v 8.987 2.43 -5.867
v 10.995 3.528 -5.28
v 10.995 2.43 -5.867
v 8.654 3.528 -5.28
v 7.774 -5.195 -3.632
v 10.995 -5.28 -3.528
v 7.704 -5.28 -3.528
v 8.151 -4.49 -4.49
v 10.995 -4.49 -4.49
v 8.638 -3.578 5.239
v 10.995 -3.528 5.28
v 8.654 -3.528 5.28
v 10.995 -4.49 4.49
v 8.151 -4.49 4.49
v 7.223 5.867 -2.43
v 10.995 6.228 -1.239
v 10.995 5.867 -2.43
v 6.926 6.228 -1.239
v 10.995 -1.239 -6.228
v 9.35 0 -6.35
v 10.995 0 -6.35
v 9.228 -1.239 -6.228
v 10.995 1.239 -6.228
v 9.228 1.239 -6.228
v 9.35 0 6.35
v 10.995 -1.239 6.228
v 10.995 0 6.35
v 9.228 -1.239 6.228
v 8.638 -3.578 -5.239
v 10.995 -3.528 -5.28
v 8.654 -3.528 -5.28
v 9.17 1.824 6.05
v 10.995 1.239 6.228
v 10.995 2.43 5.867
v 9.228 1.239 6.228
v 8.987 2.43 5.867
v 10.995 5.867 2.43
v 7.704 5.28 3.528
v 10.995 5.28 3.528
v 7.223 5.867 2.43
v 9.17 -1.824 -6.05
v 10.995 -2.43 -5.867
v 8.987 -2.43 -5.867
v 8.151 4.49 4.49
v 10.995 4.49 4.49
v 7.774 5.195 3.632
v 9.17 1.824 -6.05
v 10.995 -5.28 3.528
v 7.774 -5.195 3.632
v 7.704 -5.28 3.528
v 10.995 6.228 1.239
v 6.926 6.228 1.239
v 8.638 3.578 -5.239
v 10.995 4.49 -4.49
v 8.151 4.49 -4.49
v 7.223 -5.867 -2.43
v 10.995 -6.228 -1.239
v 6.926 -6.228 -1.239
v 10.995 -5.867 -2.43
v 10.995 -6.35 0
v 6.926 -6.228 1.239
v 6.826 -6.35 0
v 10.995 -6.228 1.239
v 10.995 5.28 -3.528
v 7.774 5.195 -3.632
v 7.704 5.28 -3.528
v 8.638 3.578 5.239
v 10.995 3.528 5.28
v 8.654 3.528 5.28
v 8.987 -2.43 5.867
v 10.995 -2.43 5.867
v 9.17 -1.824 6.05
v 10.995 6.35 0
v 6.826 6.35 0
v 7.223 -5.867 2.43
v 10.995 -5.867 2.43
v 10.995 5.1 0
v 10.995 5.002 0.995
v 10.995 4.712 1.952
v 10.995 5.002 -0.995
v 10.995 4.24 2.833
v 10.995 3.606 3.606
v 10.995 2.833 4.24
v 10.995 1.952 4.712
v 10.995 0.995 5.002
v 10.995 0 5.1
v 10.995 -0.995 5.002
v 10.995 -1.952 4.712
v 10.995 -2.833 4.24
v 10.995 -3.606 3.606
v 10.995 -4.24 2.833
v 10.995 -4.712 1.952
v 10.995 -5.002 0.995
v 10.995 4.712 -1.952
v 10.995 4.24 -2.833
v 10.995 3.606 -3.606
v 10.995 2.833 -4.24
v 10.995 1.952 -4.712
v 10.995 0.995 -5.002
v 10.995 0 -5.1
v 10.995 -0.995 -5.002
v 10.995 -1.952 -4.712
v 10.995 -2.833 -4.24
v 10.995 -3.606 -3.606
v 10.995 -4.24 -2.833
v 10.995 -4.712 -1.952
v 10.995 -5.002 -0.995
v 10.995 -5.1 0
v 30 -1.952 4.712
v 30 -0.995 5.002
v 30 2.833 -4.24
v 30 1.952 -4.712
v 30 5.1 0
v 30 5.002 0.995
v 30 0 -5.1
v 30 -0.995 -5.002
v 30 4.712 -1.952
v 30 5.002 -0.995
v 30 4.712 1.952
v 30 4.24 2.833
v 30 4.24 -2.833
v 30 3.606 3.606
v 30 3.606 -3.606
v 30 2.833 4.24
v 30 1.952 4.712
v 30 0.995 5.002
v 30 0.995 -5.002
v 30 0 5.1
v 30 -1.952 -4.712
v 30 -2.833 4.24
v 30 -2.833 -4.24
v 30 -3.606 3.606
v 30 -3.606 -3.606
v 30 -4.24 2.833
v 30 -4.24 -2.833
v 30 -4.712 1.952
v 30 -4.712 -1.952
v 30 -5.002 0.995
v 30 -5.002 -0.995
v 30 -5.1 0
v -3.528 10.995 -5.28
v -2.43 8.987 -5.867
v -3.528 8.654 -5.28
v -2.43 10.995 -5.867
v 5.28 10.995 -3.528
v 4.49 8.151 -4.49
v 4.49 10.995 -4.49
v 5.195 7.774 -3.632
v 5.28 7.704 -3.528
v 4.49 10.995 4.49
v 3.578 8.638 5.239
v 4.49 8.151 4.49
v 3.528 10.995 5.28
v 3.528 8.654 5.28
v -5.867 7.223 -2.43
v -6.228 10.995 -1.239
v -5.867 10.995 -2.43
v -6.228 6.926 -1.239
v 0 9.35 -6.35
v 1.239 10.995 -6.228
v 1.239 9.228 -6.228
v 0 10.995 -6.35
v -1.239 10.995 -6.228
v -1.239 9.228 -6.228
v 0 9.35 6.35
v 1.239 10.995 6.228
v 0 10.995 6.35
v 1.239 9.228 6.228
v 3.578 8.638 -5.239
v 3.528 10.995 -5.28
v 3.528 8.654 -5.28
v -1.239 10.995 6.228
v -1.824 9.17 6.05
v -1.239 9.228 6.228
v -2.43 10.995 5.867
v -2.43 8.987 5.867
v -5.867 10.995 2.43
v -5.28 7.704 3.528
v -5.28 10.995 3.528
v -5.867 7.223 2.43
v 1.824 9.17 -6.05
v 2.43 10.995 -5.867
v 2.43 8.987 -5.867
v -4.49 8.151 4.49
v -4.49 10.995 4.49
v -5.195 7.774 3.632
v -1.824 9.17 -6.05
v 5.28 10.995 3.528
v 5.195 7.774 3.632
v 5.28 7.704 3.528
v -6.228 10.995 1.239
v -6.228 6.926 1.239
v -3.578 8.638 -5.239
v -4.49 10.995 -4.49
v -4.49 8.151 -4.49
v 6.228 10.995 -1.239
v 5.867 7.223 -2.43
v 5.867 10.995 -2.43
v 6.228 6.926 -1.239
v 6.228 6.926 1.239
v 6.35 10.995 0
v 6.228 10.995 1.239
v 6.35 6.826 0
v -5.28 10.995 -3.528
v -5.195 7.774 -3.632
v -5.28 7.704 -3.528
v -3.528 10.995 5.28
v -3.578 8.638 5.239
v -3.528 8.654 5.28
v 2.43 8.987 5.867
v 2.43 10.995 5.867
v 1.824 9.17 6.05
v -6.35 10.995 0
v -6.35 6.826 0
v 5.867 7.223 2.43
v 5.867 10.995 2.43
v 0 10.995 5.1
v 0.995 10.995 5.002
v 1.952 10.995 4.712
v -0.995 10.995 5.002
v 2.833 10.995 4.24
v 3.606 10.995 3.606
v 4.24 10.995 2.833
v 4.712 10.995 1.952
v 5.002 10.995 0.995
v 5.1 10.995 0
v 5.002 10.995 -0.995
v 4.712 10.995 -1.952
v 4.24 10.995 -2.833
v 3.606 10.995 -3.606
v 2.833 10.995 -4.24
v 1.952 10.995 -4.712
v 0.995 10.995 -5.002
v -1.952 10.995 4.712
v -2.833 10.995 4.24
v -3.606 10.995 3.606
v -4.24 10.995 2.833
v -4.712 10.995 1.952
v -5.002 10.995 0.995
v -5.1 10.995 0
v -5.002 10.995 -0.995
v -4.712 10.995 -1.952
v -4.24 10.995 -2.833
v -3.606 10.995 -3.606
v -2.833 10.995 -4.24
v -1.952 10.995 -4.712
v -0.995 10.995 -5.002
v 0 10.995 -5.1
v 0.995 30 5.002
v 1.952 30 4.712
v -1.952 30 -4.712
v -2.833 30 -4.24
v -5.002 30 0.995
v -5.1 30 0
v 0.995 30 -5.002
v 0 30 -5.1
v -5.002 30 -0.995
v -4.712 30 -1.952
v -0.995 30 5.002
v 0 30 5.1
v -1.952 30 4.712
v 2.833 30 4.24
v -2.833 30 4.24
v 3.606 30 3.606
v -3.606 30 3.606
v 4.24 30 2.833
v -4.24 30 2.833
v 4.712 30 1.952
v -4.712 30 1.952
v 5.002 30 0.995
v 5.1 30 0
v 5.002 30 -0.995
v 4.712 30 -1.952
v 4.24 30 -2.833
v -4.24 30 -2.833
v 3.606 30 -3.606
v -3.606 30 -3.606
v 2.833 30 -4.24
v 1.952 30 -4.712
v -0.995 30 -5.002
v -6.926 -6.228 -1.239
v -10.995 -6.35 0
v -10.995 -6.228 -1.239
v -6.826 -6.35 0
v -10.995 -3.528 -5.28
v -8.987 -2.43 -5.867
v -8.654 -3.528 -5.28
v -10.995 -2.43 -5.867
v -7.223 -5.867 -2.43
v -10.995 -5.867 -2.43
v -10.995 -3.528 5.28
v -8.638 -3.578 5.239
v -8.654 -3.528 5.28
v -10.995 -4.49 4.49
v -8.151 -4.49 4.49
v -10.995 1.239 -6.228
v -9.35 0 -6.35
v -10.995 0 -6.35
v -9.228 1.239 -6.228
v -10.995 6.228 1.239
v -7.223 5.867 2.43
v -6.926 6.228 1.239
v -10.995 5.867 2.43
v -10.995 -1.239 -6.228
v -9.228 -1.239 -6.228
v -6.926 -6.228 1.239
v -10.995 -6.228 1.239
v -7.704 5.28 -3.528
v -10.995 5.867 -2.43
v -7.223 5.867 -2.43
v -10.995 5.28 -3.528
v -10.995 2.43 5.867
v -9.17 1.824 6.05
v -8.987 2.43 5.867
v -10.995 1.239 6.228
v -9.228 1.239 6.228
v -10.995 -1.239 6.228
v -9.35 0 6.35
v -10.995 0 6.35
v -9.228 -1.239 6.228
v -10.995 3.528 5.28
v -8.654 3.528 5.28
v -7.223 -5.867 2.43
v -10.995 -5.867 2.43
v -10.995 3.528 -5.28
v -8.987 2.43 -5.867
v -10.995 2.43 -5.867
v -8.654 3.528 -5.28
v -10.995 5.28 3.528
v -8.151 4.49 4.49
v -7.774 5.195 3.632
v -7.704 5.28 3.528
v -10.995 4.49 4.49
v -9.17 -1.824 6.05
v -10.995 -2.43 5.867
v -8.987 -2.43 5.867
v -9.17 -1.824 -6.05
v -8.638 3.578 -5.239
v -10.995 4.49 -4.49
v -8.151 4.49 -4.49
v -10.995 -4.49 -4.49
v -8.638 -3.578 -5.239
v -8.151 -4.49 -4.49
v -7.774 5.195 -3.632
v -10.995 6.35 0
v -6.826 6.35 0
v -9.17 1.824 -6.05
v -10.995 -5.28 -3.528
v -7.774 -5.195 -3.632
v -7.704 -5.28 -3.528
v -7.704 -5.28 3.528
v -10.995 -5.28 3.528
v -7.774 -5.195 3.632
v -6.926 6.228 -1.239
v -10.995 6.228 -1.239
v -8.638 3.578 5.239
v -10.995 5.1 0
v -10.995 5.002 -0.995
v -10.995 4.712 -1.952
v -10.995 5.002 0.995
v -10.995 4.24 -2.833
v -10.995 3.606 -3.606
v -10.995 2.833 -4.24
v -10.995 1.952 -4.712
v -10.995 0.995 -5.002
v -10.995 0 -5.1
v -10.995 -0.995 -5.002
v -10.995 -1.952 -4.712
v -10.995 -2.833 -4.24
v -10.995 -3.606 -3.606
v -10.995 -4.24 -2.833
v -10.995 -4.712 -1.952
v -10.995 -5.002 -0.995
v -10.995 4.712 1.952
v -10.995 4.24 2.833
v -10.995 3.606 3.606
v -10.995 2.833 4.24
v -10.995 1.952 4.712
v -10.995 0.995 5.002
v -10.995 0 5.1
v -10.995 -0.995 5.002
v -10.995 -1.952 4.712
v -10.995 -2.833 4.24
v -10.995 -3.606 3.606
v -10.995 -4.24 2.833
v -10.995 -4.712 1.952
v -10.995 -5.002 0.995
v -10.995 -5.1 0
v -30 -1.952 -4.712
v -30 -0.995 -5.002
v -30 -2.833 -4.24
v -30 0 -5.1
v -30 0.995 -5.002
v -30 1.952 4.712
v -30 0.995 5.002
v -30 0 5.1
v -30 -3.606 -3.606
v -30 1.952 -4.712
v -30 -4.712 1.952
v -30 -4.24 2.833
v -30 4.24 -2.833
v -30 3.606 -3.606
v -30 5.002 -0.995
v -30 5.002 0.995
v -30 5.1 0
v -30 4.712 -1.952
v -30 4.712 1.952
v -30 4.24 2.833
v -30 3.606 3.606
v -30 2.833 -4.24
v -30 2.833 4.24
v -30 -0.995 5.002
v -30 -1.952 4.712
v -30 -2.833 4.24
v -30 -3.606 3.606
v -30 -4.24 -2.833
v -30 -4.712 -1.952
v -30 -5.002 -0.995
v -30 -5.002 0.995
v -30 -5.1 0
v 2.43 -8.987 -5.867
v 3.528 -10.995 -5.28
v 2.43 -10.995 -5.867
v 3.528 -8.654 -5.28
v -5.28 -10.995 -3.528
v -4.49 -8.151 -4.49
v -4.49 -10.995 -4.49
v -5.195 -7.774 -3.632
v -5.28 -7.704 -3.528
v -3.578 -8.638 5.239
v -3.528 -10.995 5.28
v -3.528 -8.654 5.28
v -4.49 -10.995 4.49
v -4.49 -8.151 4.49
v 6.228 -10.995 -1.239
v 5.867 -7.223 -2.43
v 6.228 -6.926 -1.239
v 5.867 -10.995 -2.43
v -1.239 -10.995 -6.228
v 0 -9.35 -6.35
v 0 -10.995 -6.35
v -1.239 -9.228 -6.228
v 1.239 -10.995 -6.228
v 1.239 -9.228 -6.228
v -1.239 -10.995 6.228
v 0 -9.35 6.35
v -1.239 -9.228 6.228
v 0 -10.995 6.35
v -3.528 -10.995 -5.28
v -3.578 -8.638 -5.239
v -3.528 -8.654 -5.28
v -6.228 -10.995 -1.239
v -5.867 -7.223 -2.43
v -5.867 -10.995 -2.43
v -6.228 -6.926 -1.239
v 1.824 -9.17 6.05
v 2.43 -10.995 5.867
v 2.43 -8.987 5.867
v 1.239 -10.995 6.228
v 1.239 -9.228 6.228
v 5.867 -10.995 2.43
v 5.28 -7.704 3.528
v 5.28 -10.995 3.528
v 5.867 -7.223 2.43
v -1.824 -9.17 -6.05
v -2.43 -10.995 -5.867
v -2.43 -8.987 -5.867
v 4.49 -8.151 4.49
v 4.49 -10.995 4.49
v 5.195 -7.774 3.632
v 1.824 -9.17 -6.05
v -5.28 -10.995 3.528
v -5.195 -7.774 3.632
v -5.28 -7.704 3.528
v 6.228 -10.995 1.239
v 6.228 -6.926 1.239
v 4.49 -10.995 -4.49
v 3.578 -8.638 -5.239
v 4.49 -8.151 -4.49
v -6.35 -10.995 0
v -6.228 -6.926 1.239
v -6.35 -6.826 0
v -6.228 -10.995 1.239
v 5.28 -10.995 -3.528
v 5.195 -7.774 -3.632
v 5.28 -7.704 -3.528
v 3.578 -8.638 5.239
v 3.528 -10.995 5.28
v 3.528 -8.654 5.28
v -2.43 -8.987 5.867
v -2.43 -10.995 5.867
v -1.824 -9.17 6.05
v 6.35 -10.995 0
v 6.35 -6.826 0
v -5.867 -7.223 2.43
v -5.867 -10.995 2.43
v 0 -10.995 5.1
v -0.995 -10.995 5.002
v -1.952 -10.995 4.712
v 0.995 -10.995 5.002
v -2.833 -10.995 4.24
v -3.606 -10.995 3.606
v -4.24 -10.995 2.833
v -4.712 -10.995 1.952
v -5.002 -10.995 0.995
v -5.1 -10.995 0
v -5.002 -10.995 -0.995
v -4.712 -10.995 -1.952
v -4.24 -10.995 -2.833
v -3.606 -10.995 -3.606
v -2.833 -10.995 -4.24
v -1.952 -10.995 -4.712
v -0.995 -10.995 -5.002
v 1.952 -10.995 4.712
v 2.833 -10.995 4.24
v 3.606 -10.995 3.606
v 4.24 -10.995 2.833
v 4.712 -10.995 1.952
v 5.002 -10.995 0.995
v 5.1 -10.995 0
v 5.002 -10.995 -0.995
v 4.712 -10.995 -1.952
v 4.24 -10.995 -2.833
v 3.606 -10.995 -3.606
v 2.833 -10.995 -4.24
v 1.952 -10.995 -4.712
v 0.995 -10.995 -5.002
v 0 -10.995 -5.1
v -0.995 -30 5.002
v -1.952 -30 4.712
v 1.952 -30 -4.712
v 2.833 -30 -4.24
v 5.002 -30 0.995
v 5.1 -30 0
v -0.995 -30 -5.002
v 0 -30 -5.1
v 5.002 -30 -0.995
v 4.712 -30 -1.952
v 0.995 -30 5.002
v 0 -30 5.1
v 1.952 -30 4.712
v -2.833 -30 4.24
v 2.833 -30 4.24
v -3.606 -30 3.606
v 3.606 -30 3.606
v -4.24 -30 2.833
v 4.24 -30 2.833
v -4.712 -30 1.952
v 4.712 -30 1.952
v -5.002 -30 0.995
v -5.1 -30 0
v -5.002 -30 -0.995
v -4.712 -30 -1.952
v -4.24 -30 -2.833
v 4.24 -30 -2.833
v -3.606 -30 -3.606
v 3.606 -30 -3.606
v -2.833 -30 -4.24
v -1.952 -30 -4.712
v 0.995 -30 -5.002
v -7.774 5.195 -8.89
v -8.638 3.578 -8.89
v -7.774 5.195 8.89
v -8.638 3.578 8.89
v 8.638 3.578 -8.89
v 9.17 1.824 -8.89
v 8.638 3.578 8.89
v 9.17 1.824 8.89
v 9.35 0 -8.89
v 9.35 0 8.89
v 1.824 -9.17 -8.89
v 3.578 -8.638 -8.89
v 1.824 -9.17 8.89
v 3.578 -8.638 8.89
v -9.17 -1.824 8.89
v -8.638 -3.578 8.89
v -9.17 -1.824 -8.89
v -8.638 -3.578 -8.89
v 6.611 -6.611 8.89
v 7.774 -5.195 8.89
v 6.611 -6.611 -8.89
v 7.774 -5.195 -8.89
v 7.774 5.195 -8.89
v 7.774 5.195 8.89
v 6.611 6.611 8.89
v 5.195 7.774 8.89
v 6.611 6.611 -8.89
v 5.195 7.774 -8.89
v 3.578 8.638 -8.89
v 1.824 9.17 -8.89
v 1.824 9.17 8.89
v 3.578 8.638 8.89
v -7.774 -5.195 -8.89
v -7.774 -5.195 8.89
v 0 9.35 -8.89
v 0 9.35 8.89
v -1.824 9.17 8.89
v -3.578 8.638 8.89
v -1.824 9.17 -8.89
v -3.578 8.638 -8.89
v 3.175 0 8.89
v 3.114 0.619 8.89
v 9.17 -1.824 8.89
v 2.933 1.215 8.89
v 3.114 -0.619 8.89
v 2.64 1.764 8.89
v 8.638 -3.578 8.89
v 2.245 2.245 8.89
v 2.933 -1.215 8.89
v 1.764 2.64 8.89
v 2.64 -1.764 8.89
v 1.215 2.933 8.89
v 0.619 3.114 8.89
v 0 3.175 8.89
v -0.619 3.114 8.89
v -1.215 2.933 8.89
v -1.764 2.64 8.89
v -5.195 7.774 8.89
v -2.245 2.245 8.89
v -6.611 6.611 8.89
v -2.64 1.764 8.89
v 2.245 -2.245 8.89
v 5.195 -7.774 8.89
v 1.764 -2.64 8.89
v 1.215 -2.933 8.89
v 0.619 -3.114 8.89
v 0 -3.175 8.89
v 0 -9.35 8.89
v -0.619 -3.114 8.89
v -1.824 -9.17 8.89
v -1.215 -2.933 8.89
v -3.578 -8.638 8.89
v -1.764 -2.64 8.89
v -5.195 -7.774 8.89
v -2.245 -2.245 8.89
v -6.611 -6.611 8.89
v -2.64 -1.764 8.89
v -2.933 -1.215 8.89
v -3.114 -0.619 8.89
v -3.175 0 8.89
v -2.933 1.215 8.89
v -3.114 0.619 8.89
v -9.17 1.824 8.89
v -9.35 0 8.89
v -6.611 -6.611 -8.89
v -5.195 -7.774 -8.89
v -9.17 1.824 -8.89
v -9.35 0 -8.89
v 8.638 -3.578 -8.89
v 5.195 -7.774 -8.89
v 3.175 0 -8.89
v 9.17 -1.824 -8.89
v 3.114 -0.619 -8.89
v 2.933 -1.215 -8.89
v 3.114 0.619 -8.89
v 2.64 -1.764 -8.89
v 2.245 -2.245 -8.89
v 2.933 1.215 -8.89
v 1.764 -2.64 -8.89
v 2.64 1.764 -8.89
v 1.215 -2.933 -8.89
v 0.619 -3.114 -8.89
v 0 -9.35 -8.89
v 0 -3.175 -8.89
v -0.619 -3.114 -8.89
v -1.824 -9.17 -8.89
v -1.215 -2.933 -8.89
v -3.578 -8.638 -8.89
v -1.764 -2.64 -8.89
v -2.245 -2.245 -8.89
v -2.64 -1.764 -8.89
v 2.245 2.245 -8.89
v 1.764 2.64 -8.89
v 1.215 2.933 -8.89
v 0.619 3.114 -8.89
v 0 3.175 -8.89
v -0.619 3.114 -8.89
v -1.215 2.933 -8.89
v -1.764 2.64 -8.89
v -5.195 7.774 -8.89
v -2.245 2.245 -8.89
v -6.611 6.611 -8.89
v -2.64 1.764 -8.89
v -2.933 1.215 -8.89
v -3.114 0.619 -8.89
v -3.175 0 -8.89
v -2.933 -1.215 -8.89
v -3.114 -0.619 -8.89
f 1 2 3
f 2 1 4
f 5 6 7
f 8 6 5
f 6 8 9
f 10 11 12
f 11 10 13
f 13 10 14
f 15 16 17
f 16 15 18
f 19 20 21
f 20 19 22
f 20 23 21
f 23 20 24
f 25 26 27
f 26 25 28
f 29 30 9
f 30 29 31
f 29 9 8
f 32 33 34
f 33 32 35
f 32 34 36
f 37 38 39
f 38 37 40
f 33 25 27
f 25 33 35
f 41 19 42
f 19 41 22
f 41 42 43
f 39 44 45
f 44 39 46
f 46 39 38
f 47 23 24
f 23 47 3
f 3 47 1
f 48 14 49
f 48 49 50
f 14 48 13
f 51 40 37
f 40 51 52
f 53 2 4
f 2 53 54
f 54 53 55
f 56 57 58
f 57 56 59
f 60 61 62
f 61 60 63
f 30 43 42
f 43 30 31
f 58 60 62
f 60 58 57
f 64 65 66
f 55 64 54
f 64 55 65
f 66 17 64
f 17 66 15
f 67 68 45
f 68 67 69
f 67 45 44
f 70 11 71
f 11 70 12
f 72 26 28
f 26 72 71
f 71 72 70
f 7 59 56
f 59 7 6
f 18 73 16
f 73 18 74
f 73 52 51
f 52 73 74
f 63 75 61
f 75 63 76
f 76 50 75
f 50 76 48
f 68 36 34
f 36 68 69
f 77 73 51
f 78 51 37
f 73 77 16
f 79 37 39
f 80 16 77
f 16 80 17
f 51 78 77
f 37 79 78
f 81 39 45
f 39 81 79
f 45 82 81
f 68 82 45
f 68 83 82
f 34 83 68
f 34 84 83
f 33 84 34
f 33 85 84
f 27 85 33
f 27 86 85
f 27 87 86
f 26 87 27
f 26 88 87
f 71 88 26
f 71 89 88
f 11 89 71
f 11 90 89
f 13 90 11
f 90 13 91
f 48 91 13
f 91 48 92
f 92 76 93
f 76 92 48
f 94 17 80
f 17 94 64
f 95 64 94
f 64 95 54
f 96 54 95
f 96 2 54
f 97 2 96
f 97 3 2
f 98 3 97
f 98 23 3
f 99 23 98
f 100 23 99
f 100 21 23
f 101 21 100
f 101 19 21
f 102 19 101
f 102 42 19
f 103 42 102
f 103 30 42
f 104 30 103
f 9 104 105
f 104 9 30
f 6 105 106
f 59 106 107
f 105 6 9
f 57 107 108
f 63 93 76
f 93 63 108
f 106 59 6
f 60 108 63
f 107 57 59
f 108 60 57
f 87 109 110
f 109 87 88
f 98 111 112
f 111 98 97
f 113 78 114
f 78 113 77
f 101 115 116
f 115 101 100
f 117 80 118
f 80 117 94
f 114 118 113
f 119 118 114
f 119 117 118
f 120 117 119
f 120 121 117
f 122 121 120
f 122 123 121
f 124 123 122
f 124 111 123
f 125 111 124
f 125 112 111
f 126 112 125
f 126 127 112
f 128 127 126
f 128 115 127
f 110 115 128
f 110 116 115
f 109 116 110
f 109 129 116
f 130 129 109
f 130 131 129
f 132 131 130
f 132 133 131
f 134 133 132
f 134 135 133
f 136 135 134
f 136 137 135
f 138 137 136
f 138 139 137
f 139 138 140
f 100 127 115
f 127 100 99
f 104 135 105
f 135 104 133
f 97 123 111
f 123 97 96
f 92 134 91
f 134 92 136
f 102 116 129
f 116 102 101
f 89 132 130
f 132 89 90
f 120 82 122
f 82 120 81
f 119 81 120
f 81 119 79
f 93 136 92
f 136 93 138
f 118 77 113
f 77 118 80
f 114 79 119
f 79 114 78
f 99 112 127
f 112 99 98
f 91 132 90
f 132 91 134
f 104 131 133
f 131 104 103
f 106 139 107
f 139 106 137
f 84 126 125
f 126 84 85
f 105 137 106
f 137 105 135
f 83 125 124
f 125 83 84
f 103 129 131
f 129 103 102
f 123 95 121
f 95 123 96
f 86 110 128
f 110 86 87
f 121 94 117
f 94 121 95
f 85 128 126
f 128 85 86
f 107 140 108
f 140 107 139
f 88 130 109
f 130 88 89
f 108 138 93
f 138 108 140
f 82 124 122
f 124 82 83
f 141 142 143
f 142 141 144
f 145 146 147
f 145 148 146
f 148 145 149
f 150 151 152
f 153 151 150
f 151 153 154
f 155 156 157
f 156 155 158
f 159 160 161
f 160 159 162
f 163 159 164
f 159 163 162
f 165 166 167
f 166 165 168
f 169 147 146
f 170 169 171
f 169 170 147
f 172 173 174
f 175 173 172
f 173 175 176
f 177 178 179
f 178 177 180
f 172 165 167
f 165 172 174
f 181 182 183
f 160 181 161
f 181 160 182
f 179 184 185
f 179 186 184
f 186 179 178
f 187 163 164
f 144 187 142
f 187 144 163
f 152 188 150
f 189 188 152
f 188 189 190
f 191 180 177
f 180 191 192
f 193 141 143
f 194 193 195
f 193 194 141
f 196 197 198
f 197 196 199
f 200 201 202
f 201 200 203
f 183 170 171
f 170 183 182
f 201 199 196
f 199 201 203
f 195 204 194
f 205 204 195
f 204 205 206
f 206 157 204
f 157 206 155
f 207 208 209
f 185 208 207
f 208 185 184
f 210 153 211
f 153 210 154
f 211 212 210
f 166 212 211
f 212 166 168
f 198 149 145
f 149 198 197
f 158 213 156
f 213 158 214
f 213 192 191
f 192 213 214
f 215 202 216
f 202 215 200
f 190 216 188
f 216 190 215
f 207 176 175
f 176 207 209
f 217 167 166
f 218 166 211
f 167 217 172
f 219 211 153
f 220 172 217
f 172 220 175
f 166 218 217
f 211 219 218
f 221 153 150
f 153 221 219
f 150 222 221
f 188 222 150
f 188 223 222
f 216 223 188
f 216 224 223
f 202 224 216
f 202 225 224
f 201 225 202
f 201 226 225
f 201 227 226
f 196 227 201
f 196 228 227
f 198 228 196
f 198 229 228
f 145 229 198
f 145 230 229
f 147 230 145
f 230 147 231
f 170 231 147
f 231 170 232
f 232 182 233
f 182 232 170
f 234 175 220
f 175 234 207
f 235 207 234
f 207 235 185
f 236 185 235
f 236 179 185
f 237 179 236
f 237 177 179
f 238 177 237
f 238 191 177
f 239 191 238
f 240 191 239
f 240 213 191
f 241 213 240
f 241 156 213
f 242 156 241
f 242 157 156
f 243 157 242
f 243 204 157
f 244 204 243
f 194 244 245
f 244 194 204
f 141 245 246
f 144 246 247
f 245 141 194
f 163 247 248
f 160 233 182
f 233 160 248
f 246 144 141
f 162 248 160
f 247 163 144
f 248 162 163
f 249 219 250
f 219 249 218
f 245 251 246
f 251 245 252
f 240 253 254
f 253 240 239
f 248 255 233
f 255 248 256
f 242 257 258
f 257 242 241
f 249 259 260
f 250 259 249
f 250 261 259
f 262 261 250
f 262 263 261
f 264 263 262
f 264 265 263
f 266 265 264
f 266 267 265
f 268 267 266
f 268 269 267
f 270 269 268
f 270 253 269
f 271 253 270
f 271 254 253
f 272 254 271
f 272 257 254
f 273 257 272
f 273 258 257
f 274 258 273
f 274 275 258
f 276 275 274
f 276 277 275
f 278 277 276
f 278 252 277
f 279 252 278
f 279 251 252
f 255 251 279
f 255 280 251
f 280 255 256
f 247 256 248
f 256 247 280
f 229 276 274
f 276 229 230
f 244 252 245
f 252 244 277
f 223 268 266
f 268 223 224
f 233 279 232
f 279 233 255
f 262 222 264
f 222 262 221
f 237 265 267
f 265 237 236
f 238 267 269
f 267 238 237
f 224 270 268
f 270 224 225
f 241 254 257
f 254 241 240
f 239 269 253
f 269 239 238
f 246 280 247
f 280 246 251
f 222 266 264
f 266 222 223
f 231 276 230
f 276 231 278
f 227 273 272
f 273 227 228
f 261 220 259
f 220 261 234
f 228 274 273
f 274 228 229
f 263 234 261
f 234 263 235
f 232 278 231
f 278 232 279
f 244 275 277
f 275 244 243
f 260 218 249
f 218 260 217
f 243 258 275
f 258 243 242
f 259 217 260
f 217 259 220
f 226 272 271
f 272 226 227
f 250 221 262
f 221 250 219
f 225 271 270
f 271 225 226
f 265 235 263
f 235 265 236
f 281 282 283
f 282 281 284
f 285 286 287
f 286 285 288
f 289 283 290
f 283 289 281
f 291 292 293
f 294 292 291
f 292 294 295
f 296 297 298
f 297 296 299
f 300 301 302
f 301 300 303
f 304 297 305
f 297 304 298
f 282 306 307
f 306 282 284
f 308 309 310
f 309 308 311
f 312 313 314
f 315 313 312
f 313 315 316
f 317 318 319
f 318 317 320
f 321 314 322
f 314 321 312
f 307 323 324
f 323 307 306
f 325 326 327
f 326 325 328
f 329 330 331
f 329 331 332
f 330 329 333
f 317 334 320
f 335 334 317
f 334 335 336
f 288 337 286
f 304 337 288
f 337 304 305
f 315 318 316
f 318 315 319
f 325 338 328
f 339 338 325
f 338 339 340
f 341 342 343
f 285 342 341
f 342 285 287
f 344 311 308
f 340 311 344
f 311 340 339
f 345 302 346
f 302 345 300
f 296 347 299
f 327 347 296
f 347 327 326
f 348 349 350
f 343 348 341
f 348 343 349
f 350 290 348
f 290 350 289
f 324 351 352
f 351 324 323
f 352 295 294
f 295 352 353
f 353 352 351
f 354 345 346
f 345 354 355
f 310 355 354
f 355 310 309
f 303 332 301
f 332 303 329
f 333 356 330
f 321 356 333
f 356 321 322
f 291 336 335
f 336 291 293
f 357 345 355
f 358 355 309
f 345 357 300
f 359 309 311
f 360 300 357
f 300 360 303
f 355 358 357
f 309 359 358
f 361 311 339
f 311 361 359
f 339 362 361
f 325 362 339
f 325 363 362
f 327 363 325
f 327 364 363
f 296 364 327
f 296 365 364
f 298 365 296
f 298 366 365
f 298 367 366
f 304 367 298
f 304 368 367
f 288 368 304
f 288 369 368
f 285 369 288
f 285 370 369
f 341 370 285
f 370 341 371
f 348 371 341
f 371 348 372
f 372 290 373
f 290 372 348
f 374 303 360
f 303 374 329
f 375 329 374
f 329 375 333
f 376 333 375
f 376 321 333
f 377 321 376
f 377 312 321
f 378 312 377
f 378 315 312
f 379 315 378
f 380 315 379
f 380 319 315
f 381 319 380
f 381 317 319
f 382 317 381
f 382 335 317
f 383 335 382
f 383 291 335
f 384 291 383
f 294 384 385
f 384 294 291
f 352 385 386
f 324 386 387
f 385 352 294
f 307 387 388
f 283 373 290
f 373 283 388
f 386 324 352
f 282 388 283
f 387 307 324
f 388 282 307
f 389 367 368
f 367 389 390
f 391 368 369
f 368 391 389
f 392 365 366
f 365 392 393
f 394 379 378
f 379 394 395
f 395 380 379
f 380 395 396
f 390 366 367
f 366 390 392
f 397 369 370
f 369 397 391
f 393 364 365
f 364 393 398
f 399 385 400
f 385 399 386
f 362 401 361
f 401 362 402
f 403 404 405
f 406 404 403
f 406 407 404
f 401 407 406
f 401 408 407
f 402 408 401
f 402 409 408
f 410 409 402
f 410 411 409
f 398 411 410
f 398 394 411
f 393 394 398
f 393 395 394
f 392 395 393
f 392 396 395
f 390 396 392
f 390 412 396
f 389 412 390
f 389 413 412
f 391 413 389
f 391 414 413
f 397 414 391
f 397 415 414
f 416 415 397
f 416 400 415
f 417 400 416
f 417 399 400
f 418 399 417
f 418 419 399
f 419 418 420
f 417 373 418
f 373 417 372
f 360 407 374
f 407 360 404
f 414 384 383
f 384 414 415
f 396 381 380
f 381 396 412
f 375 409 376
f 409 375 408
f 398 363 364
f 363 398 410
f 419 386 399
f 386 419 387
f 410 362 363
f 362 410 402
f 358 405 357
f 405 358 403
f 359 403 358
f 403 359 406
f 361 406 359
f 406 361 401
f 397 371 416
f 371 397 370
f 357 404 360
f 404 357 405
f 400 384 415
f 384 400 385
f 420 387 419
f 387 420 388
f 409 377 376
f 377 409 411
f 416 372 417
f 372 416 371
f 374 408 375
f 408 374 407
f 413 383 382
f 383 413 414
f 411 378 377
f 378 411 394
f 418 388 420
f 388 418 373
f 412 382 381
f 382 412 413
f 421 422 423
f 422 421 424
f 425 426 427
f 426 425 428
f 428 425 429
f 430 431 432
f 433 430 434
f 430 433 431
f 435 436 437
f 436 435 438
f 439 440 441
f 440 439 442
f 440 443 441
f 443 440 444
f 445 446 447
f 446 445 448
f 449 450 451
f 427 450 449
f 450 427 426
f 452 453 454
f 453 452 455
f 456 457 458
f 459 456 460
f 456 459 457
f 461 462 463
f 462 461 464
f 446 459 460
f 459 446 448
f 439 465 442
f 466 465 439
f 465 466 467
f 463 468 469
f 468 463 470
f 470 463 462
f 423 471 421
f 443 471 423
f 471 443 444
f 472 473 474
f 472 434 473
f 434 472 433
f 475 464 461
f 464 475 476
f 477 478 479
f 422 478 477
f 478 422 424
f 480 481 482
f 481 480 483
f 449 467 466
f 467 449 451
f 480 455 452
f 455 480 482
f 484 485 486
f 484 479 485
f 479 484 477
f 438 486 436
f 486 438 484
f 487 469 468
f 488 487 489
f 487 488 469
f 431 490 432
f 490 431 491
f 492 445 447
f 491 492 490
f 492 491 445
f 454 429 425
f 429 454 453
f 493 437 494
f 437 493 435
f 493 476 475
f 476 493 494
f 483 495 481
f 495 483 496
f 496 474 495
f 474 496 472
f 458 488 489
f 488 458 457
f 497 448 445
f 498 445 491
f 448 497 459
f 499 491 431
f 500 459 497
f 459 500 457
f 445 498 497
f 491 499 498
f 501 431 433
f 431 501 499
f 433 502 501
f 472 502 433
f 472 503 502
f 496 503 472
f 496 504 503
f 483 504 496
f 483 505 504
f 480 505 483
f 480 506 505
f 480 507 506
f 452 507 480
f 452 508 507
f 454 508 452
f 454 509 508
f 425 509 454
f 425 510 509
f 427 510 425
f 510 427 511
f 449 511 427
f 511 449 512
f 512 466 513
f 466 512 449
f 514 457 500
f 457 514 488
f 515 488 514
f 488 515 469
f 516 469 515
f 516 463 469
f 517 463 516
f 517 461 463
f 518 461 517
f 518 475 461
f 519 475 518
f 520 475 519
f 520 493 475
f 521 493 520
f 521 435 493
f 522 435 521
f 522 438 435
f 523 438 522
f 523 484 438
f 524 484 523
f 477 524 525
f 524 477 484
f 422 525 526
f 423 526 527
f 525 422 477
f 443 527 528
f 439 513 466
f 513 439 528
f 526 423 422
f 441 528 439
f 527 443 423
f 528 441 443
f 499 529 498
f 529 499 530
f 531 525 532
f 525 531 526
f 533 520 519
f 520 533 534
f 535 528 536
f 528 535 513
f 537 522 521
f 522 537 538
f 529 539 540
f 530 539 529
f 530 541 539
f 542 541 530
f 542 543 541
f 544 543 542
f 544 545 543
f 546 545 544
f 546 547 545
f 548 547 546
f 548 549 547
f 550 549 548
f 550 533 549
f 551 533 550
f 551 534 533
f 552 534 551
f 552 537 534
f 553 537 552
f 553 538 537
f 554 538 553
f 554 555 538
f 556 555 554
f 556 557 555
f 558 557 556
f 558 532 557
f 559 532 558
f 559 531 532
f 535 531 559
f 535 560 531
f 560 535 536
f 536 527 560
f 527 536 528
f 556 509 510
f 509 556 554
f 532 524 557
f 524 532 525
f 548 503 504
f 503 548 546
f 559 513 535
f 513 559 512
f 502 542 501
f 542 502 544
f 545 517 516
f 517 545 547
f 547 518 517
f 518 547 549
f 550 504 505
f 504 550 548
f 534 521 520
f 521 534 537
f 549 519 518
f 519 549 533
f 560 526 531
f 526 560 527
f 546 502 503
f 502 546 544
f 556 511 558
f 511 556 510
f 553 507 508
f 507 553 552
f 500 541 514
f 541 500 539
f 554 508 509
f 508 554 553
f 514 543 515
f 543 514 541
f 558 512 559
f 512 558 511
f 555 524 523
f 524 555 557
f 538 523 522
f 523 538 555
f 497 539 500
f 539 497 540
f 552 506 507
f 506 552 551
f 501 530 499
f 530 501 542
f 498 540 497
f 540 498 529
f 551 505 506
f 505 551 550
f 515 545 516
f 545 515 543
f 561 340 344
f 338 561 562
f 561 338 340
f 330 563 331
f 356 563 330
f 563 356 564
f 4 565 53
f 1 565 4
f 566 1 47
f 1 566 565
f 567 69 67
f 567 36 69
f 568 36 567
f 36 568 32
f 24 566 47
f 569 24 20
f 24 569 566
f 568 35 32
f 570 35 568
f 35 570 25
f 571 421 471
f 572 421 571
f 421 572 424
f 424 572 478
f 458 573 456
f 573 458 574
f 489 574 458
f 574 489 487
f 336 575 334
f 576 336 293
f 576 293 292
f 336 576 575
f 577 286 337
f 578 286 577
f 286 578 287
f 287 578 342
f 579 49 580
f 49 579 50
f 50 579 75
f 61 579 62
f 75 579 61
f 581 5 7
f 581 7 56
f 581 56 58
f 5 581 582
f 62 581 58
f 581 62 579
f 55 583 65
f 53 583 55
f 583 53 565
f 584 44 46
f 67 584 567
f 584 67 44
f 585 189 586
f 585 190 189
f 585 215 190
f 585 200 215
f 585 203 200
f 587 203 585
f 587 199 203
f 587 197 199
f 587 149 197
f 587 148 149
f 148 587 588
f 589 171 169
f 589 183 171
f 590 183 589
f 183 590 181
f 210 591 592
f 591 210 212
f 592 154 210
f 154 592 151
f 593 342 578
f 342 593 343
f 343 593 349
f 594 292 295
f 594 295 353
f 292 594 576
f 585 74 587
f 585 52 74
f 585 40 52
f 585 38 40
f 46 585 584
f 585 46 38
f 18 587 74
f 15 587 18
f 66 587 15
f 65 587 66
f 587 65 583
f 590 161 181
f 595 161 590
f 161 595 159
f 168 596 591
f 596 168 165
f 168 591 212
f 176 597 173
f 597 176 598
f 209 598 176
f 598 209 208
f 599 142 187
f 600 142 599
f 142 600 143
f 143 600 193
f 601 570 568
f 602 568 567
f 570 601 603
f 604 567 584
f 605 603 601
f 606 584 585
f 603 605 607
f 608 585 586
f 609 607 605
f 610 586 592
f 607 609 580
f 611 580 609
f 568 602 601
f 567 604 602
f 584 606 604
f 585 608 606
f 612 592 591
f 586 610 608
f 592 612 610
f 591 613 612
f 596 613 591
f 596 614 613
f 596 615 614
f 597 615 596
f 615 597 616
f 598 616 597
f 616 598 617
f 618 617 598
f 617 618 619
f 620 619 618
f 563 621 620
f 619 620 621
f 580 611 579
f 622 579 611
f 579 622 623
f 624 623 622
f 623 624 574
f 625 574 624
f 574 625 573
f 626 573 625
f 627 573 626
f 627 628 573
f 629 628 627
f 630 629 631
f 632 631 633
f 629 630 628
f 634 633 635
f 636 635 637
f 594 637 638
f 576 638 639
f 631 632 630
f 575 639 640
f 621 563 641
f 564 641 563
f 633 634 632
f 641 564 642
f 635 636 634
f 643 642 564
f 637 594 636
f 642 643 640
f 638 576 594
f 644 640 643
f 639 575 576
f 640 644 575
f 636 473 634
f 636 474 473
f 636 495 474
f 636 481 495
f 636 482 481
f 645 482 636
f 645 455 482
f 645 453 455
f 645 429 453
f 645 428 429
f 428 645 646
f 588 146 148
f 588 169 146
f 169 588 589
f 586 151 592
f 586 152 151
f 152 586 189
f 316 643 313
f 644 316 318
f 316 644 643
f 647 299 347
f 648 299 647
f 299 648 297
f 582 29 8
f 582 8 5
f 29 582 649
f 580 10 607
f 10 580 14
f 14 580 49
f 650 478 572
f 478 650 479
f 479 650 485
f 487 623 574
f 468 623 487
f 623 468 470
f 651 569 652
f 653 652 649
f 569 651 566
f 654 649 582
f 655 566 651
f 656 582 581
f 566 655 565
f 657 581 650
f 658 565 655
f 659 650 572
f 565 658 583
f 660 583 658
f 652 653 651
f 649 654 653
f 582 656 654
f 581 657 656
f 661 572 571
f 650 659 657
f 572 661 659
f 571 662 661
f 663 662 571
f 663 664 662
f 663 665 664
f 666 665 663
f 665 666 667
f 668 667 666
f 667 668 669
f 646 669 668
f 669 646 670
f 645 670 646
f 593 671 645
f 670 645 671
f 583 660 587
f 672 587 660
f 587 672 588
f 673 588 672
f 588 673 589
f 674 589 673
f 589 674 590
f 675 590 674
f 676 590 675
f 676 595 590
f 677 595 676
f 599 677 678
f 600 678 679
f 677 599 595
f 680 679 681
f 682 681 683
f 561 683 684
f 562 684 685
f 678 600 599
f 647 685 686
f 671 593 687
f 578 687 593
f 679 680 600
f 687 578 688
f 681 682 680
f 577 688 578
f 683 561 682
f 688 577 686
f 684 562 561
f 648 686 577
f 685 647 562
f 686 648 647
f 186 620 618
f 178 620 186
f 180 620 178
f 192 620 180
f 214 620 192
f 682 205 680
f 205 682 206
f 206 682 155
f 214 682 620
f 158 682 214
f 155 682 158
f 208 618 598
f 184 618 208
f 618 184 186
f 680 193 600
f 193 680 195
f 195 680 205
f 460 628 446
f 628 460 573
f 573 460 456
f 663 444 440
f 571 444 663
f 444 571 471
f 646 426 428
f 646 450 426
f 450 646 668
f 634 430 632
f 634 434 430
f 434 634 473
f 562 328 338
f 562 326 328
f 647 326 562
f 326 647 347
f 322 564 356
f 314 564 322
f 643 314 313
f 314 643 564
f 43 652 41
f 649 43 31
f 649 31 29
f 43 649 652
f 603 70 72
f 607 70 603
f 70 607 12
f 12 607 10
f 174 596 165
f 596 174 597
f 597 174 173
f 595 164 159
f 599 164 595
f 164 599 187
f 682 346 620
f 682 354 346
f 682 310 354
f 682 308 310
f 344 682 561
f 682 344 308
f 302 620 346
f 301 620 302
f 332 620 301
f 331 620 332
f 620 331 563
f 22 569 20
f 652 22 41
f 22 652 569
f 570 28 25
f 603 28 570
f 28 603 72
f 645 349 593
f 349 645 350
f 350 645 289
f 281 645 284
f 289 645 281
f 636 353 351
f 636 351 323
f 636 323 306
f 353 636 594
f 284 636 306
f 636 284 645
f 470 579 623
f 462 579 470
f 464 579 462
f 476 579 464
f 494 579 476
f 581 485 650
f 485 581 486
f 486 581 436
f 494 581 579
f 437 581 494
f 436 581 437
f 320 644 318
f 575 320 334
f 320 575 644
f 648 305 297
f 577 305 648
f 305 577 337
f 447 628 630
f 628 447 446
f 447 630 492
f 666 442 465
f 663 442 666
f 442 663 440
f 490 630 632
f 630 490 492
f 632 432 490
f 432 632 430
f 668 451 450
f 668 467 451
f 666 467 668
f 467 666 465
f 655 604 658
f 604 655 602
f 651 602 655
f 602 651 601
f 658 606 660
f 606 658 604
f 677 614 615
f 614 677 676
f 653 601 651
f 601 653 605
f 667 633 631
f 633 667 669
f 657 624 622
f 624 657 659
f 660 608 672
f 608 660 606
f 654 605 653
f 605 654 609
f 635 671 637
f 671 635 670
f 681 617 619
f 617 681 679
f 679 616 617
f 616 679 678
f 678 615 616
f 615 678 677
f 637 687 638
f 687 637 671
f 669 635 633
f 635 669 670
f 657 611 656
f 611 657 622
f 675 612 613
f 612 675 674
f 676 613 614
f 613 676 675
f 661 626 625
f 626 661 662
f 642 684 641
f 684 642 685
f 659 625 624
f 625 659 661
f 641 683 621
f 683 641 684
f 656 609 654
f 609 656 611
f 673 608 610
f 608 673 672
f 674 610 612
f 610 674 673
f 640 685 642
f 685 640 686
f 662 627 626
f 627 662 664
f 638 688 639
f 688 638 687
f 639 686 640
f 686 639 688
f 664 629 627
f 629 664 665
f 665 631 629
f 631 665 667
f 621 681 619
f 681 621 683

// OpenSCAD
$fn = 32;

// ----------------------------------------------------------------------
// Cardan cross: 60 mm span, 12.7 mm trunnions
// ----------------------------------------------------------------------

// --- parameters (mm) ---
journal_d = 12.7;         // trunnion diameter
arm_len = 30;             // trunnion length from the centre
step_r = 4.32;            // step position from the centre
step_d = 10.2;            // journal diameter after the step
hub_d = 18.7;             // hub diameter
hub_h = 17.78;            // hub height
bore_d = 6.35;            // hub bore

difference() {
  union() {
    /* hub along the joint axis */
    cylinder(h = hub_h, d = hub_d, center = true);
    for (a = [0 : 90 : 270]) rotate([0, 0, a]) {
      /* trunnion, sunk into the hub */
      translate([hub_d / 4, 0, 0]) rotate([0, 90, 0]) cylinder(h = step_r + 2, d = journal_d);
      /* stepped journal out to the tip */
      translate([step_r - 0.5, 0, 0]) rotate([0, 90, 0]) cylinder(h = arm_len + 0.5 - step_r, d = step_d);
    }
  }
  /* lubrication bore through the hub, 2.5 mm clear on both sides */
  translate([0, 0, -hub_h / 2 - 2.5]) cylinder(h = hub_h + 5, d = bore_d);
}
